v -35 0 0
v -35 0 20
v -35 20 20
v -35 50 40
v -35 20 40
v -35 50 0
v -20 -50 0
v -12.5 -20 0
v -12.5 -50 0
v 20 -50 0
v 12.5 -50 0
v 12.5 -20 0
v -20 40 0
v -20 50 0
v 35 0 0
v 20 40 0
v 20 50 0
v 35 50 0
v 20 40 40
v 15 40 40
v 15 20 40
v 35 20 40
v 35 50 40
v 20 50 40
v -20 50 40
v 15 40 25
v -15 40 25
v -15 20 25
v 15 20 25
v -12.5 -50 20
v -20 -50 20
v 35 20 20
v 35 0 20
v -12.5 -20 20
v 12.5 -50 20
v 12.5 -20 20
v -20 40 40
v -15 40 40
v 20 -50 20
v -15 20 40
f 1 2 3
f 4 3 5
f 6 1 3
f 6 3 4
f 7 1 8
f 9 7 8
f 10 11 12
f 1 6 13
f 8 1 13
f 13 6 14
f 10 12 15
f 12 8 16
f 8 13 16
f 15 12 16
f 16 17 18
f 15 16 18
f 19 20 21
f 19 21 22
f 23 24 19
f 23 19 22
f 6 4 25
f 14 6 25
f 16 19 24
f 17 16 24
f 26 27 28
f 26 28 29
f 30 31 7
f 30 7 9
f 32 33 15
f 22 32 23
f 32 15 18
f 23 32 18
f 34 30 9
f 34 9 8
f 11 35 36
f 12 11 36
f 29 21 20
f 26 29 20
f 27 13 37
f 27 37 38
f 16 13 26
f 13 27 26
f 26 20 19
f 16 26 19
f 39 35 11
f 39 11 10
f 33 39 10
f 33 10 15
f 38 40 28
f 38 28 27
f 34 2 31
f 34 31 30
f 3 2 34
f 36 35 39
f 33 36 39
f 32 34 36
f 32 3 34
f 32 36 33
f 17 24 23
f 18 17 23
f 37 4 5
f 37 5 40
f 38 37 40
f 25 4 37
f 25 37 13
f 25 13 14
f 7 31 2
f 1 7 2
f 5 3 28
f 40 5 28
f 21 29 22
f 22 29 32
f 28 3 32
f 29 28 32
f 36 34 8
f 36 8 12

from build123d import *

# Parameters (mm, degrees)
SKETCH_W        = 70
SKETCH_H        = 100
PAD_DEPTH       = 20
POCKET_DEPTH    = 20.001
SKETCH002_W     = 25
SKETCH002_H     = 30
POCKET001_DEPTH = 20.001
SKETCH003_W     = 70
SKETCH003_H     = 30
PAD001_DEPTH    = 20
SKETCH004_W     = 40
SKETCH004_H     = 21.64003
POCKET002_DEPTH = 40.001
SKETCH005_W     = 30
SKETCH005_H     = 38.026675
POCKET003_DEPTH = 15


with BuildPart() as part:
    # Sketch → Pad (new body)
    with BuildSketch(Plane.XY):
        Rectangle(SKETCH_W, SKETCH_H)
    extrude(amount=PAD_DEPTH)

    # Sketch001 → Pocket (cut, through all)
    with BuildSketch(Plane.XY.offset(20)):
        Polygon((35, 0), (35, -50), (20, -50), align=None)
        Polygon((-35, 0), (-35, -50), (-20, -50), align=None)
    extrude(amount=-POCKET_DEPTH, mode=Mode.SUBTRACT)

    # Sketch002 → Pocket001 (cut, through all)
    with BuildSketch(Plane.XY.offset(20)):
        with Locations((0, -35)):
            Rectangle(SKETCH002_W, SKETCH002_H)
    extrude(amount=-POCKET001_DEPTH, mode=Mode.SUBTRACT)

    # Sketch003 → Pad001 (new body)
    with BuildSketch(Plane.XY.offset(20)):
        with Locations((0, 35)):
            Rectangle(SKETCH003_W, SKETCH003_H)
    extrude(amount=PAD001_DEPTH)

    # Sketch004 → Pocket002 (cut, through all)
    with BuildSketch(Plane.XY.offset(40)):
        with Locations((0, 50.820015)):
            Rectangle(SKETCH004_W, SKETCH004_H)
    extrude(amount=-POCKET002_DEPTH, mode=Mode.SUBTRACT)

    # Sketch005 → Pocket003 (cut)
    with BuildSketch(Plane.XY.offset(40)):
        with Locations((0, 31.280009)):
            Rectangle(SKETCH005_W, SKETCH005_H)
    extrude(amount=-POCKET003_DEPTH, mode=Mode.SUBTRACT)


solid = part.part
